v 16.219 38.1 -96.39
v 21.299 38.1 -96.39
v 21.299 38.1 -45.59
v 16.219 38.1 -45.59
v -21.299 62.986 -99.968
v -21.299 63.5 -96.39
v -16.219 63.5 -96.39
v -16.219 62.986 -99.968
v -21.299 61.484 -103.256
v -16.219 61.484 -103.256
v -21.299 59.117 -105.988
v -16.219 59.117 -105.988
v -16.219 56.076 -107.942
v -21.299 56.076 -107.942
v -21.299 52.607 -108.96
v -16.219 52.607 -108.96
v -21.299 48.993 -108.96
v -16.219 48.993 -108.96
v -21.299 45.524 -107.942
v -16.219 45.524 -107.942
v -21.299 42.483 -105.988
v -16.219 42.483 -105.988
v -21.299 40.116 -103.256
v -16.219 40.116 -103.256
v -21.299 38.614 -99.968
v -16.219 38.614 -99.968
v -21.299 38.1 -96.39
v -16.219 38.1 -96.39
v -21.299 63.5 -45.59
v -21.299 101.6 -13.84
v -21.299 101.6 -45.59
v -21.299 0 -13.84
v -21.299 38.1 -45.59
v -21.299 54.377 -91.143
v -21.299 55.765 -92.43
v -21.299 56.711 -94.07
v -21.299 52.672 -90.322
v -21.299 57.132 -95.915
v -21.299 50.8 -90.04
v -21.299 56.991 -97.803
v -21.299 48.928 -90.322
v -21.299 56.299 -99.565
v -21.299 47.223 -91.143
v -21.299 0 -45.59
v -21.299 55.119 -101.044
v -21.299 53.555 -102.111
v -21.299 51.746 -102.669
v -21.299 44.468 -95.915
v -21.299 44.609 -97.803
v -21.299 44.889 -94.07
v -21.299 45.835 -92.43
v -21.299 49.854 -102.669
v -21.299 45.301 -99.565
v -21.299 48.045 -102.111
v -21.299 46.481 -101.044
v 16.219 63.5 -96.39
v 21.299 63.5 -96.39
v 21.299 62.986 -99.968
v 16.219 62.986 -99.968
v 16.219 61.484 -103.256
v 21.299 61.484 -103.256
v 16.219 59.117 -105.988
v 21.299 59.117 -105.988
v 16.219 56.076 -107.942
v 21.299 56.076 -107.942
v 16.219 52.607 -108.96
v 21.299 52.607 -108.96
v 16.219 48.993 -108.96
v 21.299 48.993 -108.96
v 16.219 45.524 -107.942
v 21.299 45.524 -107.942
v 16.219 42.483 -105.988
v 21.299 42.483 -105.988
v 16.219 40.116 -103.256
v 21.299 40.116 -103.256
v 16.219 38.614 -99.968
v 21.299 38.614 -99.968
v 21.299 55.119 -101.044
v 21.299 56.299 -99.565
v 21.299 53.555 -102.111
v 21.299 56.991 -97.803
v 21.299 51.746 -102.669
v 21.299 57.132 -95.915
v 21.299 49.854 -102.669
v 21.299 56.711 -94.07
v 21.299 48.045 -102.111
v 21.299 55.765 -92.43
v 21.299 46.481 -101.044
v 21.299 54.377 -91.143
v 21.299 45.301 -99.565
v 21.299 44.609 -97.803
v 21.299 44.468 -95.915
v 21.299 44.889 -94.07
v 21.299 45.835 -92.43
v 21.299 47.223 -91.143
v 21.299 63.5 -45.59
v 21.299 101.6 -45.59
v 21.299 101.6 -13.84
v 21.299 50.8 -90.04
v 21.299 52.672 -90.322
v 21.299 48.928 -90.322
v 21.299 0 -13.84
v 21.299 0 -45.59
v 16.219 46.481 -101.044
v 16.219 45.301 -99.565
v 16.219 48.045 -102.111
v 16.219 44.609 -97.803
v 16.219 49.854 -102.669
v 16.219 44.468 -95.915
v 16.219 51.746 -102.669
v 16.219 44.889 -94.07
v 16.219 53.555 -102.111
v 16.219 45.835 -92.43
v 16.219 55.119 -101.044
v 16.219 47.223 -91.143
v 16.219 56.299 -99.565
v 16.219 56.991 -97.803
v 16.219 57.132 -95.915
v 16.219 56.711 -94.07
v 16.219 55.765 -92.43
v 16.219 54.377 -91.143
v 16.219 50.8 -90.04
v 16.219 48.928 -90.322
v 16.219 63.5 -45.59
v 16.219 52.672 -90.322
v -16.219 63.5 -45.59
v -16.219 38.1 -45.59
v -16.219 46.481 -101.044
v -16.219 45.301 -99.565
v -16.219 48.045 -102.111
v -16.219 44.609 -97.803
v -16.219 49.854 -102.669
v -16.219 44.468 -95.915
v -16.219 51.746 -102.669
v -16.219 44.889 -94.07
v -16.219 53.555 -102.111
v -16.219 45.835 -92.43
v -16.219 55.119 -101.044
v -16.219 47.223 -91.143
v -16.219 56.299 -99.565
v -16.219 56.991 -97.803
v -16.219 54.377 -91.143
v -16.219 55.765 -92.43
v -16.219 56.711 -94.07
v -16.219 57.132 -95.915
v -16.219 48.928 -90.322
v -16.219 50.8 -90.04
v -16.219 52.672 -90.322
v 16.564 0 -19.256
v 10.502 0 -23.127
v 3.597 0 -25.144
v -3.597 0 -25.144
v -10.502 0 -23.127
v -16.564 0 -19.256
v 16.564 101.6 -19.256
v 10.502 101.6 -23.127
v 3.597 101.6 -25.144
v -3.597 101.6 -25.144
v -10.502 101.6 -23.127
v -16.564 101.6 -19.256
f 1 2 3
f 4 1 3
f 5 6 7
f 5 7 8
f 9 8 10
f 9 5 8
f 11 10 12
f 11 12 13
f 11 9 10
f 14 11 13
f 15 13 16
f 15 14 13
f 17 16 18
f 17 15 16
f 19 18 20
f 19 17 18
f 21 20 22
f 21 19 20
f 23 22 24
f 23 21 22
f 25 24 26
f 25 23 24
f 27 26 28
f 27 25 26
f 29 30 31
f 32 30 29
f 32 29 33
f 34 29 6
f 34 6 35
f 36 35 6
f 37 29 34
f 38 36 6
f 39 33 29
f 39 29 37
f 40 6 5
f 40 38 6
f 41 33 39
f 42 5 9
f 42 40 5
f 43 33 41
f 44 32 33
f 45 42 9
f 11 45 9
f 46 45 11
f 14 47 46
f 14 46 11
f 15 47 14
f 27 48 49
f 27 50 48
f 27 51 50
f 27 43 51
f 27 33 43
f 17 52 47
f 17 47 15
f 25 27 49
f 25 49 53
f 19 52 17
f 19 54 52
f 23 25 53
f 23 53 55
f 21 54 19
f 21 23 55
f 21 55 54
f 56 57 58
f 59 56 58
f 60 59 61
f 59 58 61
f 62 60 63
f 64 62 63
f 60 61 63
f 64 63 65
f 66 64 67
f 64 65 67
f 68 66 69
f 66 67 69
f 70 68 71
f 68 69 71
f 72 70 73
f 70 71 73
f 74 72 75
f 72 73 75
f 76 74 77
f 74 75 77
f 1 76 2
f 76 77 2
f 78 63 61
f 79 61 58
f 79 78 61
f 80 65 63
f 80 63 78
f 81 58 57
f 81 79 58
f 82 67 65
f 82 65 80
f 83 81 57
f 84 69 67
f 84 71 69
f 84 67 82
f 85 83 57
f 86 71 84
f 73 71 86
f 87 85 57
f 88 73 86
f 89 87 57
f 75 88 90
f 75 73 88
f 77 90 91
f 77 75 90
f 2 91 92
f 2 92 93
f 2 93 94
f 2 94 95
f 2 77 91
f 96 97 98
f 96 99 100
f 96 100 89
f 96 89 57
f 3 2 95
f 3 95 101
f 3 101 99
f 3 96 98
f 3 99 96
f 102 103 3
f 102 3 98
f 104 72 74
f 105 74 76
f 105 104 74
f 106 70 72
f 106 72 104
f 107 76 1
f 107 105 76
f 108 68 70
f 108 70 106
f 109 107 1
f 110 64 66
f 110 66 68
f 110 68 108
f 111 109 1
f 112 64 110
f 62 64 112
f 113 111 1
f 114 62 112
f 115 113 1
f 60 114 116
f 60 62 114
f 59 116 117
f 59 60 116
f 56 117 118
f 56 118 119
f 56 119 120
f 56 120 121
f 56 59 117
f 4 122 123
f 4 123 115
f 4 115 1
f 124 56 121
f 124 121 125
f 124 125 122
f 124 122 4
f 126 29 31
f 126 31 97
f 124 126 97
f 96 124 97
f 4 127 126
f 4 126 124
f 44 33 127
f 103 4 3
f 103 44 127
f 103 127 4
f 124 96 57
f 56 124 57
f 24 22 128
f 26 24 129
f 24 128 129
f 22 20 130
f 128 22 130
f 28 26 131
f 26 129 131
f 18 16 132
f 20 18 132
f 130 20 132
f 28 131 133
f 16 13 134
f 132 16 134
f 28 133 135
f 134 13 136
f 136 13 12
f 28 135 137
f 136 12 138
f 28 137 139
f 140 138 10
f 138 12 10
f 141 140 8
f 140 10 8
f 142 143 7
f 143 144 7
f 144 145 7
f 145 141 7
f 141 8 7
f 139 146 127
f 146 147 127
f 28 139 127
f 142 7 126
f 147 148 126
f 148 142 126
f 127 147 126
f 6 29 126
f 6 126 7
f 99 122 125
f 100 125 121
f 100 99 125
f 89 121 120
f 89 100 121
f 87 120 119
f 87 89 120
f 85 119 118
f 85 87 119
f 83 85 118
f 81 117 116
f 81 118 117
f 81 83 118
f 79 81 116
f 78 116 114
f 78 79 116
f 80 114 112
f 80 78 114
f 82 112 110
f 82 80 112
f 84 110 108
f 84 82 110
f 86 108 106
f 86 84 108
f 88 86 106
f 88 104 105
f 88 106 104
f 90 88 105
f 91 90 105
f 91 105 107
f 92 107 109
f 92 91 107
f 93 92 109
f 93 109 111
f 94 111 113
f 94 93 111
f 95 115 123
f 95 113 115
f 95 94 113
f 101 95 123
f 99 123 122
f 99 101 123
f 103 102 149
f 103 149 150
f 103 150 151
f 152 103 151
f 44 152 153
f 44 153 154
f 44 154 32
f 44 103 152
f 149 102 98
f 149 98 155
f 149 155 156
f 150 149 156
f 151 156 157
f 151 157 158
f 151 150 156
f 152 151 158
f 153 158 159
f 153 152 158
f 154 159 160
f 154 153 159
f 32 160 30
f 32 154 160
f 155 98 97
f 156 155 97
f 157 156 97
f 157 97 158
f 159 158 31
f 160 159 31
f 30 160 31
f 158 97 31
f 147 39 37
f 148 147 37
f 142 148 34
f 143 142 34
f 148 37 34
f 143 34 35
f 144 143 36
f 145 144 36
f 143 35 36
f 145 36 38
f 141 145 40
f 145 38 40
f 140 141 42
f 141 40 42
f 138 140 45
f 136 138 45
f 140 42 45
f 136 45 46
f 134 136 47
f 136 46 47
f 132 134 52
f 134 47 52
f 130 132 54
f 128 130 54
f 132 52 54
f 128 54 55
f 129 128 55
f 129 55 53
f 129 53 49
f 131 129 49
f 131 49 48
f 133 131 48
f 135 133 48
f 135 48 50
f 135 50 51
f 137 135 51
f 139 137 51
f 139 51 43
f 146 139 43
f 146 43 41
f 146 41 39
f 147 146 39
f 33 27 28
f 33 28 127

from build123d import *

# Parameters (mm, degrees)
BOSS_EXTRUDE2_DEPTH = 101.6
BOSS_EXTRUDE3_DEPTH = 5.08
SKETCH4_R           = 6.35
CUT_EXTRUDE1_DEPTH  = 156.040615371


with BuildPart() as part:
    # Sketch1 → Boss-Extrude2 (new body)
    with BuildSketch(Plane(origin=(0, 0, 0), x_dir=(1, 0, 0), z_dir=(0, 1, 0))):
        with BuildLine():
            Line((-21.298547486, 13.839504146), (-21.298547486, 45.589504146))
            Line((-21.298547486, 45.589504146), (21.298547486, 45.589504146))
            Line((21.298547486, 45.589504146), (21.298547486, 13.839504146))
            ThreePointArc((21.298547486, 13.839504146), (0, 25.4), (-21.298547486, 13.839504146))
        make_face()
    extrude(amount=BOSS_EXTRUDE2_DEPTH)

    # Sketch3 → Boss-Extrude3 (add)
    with BuildSketch(Plane.ZY.offset(21.298547486)):
        with BuildLine():
            Line((-45.589504146, 63.5), (-96.389504146, 63.5))
            ThreePointArc((-96.389504146, 63.5), (-109.089504146, 50.8), (-96.389504146, 38.1))
            Line((-96.389504146, 38.1), (-45.589504146, 38.1))
            Line((-45.589504146, 38.1), (-45.589504146, 63.5))
        make_face()
    boss_extrude3 = extrude(amount=-BOSS_EXTRUDE3_DEPTH)

    # Sketch4 → Cut-Extrude1 (cut, through all)
    with BuildSketch(Plane.ZY.offset(21.298547486)):
        with Locations((-96.389504146, 50.8)):
            Circle(SKETCH4_R)
    cut_extrude1 = extrude(amount=-CUT_EXTRUDE1_DEPTH, mode=Mode.SUBTRACT)

    # Mirror1: Boss-Extrude3, Cut-Extrude1 across plane
    add(boss_extrude3.mirror(Plane(origin=(0, 0, 0), x_dir=(0, 0, 1), z_dir=(1, 0, 0))))
    add(cut_extrude1.mirror(Plane(origin=(0, 0, 0), x_dir=(0, 0, 1), z_dir=(1, 0, 0))), mode=Mode.SUBTRACT)


solid = part.part
